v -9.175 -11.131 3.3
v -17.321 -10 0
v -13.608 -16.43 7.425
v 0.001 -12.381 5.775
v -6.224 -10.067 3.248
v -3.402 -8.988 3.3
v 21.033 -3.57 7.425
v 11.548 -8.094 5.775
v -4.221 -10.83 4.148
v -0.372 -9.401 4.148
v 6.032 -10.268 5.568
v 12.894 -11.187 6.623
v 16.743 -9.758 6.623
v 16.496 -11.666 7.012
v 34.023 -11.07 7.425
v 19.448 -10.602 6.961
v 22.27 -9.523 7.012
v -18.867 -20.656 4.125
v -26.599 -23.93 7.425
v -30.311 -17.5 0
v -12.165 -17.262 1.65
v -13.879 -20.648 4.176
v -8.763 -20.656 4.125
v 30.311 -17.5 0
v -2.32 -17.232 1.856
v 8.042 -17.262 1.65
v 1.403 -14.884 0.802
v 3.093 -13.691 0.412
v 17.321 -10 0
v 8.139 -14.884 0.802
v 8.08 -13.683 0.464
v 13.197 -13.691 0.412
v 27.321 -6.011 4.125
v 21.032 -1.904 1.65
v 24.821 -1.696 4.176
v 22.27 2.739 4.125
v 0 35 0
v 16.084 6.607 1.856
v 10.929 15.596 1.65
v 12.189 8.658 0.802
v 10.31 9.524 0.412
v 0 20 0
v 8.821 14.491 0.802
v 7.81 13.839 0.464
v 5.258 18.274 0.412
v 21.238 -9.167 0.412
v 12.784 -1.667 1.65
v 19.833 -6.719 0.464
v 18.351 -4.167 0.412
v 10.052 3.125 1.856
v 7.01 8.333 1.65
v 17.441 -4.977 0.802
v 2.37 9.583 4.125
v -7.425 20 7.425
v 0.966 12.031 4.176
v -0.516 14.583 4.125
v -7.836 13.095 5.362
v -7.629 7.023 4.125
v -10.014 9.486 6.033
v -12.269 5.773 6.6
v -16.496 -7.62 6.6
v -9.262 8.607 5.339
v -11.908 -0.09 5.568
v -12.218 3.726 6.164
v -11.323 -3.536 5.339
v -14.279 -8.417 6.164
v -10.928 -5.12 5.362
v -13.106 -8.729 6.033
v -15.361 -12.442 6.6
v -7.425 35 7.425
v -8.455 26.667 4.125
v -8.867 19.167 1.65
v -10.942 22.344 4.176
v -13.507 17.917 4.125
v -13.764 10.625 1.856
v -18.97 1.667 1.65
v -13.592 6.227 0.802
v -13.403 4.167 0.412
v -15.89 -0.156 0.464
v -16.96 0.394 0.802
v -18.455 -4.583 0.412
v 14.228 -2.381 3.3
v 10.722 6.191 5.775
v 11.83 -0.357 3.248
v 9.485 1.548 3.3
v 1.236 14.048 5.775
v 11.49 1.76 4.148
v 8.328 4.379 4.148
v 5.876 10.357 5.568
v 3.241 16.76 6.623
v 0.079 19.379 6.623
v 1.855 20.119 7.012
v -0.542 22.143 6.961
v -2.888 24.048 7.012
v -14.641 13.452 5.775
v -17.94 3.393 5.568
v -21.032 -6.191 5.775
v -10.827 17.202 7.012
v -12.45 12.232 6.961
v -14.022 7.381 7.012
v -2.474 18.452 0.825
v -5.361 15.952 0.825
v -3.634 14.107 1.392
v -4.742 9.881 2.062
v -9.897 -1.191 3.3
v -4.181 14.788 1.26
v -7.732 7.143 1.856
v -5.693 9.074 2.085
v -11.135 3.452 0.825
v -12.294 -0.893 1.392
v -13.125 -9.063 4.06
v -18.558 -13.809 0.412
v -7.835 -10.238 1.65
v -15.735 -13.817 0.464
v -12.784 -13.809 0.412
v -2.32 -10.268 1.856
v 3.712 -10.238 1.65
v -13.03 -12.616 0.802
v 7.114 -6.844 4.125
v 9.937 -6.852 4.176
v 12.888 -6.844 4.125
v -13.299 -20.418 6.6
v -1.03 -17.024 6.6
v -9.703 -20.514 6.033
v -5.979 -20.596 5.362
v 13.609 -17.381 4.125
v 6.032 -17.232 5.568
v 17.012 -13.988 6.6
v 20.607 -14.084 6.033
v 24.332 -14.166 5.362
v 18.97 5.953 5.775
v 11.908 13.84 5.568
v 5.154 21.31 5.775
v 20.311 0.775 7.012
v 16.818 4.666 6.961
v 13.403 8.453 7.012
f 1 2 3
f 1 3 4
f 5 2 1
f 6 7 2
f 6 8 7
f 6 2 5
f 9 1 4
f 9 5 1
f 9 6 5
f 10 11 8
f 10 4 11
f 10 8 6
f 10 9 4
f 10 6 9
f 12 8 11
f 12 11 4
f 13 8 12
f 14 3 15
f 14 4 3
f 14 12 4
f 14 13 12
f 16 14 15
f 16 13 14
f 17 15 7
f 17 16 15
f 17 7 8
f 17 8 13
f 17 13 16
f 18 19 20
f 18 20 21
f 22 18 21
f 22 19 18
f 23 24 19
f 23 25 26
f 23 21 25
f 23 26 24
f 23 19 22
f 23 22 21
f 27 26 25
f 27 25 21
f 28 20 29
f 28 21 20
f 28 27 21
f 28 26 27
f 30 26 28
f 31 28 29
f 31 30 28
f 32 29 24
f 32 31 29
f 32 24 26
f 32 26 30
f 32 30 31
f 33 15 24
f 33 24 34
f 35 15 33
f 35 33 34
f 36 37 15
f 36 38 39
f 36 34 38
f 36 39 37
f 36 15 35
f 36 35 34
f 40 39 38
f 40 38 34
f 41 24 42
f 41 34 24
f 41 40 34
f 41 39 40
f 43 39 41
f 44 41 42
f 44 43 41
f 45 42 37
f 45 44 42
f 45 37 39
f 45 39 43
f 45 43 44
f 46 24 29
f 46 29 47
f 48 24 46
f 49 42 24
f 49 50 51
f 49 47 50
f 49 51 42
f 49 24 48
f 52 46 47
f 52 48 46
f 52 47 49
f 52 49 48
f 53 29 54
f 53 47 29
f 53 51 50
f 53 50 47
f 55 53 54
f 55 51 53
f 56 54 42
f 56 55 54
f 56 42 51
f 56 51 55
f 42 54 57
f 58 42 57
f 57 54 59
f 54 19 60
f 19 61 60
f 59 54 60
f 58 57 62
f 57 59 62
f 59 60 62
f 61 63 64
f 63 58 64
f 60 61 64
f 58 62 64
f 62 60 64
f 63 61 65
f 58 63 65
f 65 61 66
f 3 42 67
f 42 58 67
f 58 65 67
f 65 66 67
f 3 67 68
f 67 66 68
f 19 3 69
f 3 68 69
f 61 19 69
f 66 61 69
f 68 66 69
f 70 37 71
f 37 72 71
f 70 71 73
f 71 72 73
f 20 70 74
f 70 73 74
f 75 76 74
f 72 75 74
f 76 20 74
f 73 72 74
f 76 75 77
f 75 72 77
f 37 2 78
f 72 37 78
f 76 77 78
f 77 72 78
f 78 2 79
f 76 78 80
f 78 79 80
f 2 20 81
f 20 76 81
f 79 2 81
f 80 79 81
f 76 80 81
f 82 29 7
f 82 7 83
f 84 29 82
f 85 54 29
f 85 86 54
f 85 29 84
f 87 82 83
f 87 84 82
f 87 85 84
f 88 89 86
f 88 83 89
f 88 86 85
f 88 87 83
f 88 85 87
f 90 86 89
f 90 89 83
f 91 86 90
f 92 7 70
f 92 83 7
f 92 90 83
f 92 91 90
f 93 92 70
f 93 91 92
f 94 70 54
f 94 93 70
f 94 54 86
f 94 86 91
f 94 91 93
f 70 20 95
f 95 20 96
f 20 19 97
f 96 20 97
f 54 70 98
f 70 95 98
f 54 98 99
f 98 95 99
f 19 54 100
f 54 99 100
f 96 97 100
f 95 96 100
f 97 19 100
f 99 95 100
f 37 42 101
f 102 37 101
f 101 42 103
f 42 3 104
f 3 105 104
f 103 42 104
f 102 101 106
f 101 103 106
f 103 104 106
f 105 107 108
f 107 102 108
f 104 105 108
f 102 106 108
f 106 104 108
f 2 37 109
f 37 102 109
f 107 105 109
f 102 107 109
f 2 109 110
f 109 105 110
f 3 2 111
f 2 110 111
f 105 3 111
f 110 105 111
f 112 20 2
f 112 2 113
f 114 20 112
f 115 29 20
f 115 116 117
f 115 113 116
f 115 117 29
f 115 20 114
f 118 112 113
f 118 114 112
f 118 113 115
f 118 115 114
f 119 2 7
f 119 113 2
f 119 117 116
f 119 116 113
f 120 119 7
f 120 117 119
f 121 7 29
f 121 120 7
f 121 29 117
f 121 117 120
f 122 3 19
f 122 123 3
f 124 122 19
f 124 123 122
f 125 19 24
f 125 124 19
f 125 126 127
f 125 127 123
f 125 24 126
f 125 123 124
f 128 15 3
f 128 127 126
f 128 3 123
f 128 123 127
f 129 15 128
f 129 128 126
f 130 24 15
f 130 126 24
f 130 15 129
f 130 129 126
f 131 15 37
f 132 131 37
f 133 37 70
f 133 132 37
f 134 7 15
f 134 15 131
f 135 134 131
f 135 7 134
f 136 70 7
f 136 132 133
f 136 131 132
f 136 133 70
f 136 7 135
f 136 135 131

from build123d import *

# Parameters (mm, degrees)
F2_W       = 10.5
F2_H       = 15
F7_FACE_W  = 15
F7_FACE_H  = 10.5
F8_FACE_W  = 15
F8_FACE_H  = 10.5
F7_FACE1_W = 15
F7_FACE1_H = 10.5


with BuildPart() as f7:
    # F2 (on line) → F7 section 0
    with BuildSketch(Plane(origin=(0, 0, 0), x_dir=(0.7071067812, 0, -0.7071067812), z_dir=(0.7071067812, 0, 0.7071067812))):
        with Locations((-5.25, 27.5)):
            Rectangle(F2_W, F2_H)
    # F4 (on line) → F7 section 1
    with BuildSketch(Plane(origin=(0, 0, 0), x_dir=(0.9354143467, 0.2314550249, 0.2672612419), z_dir=(0.3535533906, -0.6123724357, -0.7071067812))):
        Polygon((-18.5164019955, 7.5592894602), (-14.5477750289, 17.2804005078), (-28.4350765254, 22.9498676029), (-32.403703492, 13.2287565553), align=None)
    loft()

    # F7_face (on face) → F8 section 0
    with BuildSketch(Plane(origin=(-21.9595433035, -16.9649552874, 3.7123106012), x_dir=(0.8660254038, 0.5, 0), z_dir=(0.3535533906, -0.6123724357, -0.7071067812))):
        Rectangle(F7_FACE_W, F7_FACE_H)
    # F6 (on line) → F8 section 1
    with BuildSketch(Plane(origin=(0, 0, 0), x_dir=(0.9354143467, -0.2314550249, 0.2672612419), z_dir=(0.3535533906, 0.6123724357, -0.7071067812))):
        Polygon((32.403703492, 13.2287565553), (18.5164019955, 7.5592894602), (22.485028962, -2.1618215874), (36.3723304586, 3.5076455077), align=None)
    loft()

    # F8_face (on face) → F9 section 0
    with BuildSketch(Plane(origin=(25.6718539047, -10.5350447126, 3.7123106012), x_dir=(-0.8660254038, 0.5, 0), z_dir=(0.3535533906, 0.6123724357, -0.7071067812))):
        Rectangle(F8_FACE_W, F8_FACE_H)
    # F7_face1 (on face) → F9 section 1
    with BuildSketch(Plane(origin=(-3.7123106012, 27.5, 3.7123106012), x_dir=(0, 1, 0), z_dir=(0.7071067812, 0, 0.7071067812))):
        Rectangle(F7_FACE1_W, F7_FACE1_H)
    loft()


solid = f7.part
